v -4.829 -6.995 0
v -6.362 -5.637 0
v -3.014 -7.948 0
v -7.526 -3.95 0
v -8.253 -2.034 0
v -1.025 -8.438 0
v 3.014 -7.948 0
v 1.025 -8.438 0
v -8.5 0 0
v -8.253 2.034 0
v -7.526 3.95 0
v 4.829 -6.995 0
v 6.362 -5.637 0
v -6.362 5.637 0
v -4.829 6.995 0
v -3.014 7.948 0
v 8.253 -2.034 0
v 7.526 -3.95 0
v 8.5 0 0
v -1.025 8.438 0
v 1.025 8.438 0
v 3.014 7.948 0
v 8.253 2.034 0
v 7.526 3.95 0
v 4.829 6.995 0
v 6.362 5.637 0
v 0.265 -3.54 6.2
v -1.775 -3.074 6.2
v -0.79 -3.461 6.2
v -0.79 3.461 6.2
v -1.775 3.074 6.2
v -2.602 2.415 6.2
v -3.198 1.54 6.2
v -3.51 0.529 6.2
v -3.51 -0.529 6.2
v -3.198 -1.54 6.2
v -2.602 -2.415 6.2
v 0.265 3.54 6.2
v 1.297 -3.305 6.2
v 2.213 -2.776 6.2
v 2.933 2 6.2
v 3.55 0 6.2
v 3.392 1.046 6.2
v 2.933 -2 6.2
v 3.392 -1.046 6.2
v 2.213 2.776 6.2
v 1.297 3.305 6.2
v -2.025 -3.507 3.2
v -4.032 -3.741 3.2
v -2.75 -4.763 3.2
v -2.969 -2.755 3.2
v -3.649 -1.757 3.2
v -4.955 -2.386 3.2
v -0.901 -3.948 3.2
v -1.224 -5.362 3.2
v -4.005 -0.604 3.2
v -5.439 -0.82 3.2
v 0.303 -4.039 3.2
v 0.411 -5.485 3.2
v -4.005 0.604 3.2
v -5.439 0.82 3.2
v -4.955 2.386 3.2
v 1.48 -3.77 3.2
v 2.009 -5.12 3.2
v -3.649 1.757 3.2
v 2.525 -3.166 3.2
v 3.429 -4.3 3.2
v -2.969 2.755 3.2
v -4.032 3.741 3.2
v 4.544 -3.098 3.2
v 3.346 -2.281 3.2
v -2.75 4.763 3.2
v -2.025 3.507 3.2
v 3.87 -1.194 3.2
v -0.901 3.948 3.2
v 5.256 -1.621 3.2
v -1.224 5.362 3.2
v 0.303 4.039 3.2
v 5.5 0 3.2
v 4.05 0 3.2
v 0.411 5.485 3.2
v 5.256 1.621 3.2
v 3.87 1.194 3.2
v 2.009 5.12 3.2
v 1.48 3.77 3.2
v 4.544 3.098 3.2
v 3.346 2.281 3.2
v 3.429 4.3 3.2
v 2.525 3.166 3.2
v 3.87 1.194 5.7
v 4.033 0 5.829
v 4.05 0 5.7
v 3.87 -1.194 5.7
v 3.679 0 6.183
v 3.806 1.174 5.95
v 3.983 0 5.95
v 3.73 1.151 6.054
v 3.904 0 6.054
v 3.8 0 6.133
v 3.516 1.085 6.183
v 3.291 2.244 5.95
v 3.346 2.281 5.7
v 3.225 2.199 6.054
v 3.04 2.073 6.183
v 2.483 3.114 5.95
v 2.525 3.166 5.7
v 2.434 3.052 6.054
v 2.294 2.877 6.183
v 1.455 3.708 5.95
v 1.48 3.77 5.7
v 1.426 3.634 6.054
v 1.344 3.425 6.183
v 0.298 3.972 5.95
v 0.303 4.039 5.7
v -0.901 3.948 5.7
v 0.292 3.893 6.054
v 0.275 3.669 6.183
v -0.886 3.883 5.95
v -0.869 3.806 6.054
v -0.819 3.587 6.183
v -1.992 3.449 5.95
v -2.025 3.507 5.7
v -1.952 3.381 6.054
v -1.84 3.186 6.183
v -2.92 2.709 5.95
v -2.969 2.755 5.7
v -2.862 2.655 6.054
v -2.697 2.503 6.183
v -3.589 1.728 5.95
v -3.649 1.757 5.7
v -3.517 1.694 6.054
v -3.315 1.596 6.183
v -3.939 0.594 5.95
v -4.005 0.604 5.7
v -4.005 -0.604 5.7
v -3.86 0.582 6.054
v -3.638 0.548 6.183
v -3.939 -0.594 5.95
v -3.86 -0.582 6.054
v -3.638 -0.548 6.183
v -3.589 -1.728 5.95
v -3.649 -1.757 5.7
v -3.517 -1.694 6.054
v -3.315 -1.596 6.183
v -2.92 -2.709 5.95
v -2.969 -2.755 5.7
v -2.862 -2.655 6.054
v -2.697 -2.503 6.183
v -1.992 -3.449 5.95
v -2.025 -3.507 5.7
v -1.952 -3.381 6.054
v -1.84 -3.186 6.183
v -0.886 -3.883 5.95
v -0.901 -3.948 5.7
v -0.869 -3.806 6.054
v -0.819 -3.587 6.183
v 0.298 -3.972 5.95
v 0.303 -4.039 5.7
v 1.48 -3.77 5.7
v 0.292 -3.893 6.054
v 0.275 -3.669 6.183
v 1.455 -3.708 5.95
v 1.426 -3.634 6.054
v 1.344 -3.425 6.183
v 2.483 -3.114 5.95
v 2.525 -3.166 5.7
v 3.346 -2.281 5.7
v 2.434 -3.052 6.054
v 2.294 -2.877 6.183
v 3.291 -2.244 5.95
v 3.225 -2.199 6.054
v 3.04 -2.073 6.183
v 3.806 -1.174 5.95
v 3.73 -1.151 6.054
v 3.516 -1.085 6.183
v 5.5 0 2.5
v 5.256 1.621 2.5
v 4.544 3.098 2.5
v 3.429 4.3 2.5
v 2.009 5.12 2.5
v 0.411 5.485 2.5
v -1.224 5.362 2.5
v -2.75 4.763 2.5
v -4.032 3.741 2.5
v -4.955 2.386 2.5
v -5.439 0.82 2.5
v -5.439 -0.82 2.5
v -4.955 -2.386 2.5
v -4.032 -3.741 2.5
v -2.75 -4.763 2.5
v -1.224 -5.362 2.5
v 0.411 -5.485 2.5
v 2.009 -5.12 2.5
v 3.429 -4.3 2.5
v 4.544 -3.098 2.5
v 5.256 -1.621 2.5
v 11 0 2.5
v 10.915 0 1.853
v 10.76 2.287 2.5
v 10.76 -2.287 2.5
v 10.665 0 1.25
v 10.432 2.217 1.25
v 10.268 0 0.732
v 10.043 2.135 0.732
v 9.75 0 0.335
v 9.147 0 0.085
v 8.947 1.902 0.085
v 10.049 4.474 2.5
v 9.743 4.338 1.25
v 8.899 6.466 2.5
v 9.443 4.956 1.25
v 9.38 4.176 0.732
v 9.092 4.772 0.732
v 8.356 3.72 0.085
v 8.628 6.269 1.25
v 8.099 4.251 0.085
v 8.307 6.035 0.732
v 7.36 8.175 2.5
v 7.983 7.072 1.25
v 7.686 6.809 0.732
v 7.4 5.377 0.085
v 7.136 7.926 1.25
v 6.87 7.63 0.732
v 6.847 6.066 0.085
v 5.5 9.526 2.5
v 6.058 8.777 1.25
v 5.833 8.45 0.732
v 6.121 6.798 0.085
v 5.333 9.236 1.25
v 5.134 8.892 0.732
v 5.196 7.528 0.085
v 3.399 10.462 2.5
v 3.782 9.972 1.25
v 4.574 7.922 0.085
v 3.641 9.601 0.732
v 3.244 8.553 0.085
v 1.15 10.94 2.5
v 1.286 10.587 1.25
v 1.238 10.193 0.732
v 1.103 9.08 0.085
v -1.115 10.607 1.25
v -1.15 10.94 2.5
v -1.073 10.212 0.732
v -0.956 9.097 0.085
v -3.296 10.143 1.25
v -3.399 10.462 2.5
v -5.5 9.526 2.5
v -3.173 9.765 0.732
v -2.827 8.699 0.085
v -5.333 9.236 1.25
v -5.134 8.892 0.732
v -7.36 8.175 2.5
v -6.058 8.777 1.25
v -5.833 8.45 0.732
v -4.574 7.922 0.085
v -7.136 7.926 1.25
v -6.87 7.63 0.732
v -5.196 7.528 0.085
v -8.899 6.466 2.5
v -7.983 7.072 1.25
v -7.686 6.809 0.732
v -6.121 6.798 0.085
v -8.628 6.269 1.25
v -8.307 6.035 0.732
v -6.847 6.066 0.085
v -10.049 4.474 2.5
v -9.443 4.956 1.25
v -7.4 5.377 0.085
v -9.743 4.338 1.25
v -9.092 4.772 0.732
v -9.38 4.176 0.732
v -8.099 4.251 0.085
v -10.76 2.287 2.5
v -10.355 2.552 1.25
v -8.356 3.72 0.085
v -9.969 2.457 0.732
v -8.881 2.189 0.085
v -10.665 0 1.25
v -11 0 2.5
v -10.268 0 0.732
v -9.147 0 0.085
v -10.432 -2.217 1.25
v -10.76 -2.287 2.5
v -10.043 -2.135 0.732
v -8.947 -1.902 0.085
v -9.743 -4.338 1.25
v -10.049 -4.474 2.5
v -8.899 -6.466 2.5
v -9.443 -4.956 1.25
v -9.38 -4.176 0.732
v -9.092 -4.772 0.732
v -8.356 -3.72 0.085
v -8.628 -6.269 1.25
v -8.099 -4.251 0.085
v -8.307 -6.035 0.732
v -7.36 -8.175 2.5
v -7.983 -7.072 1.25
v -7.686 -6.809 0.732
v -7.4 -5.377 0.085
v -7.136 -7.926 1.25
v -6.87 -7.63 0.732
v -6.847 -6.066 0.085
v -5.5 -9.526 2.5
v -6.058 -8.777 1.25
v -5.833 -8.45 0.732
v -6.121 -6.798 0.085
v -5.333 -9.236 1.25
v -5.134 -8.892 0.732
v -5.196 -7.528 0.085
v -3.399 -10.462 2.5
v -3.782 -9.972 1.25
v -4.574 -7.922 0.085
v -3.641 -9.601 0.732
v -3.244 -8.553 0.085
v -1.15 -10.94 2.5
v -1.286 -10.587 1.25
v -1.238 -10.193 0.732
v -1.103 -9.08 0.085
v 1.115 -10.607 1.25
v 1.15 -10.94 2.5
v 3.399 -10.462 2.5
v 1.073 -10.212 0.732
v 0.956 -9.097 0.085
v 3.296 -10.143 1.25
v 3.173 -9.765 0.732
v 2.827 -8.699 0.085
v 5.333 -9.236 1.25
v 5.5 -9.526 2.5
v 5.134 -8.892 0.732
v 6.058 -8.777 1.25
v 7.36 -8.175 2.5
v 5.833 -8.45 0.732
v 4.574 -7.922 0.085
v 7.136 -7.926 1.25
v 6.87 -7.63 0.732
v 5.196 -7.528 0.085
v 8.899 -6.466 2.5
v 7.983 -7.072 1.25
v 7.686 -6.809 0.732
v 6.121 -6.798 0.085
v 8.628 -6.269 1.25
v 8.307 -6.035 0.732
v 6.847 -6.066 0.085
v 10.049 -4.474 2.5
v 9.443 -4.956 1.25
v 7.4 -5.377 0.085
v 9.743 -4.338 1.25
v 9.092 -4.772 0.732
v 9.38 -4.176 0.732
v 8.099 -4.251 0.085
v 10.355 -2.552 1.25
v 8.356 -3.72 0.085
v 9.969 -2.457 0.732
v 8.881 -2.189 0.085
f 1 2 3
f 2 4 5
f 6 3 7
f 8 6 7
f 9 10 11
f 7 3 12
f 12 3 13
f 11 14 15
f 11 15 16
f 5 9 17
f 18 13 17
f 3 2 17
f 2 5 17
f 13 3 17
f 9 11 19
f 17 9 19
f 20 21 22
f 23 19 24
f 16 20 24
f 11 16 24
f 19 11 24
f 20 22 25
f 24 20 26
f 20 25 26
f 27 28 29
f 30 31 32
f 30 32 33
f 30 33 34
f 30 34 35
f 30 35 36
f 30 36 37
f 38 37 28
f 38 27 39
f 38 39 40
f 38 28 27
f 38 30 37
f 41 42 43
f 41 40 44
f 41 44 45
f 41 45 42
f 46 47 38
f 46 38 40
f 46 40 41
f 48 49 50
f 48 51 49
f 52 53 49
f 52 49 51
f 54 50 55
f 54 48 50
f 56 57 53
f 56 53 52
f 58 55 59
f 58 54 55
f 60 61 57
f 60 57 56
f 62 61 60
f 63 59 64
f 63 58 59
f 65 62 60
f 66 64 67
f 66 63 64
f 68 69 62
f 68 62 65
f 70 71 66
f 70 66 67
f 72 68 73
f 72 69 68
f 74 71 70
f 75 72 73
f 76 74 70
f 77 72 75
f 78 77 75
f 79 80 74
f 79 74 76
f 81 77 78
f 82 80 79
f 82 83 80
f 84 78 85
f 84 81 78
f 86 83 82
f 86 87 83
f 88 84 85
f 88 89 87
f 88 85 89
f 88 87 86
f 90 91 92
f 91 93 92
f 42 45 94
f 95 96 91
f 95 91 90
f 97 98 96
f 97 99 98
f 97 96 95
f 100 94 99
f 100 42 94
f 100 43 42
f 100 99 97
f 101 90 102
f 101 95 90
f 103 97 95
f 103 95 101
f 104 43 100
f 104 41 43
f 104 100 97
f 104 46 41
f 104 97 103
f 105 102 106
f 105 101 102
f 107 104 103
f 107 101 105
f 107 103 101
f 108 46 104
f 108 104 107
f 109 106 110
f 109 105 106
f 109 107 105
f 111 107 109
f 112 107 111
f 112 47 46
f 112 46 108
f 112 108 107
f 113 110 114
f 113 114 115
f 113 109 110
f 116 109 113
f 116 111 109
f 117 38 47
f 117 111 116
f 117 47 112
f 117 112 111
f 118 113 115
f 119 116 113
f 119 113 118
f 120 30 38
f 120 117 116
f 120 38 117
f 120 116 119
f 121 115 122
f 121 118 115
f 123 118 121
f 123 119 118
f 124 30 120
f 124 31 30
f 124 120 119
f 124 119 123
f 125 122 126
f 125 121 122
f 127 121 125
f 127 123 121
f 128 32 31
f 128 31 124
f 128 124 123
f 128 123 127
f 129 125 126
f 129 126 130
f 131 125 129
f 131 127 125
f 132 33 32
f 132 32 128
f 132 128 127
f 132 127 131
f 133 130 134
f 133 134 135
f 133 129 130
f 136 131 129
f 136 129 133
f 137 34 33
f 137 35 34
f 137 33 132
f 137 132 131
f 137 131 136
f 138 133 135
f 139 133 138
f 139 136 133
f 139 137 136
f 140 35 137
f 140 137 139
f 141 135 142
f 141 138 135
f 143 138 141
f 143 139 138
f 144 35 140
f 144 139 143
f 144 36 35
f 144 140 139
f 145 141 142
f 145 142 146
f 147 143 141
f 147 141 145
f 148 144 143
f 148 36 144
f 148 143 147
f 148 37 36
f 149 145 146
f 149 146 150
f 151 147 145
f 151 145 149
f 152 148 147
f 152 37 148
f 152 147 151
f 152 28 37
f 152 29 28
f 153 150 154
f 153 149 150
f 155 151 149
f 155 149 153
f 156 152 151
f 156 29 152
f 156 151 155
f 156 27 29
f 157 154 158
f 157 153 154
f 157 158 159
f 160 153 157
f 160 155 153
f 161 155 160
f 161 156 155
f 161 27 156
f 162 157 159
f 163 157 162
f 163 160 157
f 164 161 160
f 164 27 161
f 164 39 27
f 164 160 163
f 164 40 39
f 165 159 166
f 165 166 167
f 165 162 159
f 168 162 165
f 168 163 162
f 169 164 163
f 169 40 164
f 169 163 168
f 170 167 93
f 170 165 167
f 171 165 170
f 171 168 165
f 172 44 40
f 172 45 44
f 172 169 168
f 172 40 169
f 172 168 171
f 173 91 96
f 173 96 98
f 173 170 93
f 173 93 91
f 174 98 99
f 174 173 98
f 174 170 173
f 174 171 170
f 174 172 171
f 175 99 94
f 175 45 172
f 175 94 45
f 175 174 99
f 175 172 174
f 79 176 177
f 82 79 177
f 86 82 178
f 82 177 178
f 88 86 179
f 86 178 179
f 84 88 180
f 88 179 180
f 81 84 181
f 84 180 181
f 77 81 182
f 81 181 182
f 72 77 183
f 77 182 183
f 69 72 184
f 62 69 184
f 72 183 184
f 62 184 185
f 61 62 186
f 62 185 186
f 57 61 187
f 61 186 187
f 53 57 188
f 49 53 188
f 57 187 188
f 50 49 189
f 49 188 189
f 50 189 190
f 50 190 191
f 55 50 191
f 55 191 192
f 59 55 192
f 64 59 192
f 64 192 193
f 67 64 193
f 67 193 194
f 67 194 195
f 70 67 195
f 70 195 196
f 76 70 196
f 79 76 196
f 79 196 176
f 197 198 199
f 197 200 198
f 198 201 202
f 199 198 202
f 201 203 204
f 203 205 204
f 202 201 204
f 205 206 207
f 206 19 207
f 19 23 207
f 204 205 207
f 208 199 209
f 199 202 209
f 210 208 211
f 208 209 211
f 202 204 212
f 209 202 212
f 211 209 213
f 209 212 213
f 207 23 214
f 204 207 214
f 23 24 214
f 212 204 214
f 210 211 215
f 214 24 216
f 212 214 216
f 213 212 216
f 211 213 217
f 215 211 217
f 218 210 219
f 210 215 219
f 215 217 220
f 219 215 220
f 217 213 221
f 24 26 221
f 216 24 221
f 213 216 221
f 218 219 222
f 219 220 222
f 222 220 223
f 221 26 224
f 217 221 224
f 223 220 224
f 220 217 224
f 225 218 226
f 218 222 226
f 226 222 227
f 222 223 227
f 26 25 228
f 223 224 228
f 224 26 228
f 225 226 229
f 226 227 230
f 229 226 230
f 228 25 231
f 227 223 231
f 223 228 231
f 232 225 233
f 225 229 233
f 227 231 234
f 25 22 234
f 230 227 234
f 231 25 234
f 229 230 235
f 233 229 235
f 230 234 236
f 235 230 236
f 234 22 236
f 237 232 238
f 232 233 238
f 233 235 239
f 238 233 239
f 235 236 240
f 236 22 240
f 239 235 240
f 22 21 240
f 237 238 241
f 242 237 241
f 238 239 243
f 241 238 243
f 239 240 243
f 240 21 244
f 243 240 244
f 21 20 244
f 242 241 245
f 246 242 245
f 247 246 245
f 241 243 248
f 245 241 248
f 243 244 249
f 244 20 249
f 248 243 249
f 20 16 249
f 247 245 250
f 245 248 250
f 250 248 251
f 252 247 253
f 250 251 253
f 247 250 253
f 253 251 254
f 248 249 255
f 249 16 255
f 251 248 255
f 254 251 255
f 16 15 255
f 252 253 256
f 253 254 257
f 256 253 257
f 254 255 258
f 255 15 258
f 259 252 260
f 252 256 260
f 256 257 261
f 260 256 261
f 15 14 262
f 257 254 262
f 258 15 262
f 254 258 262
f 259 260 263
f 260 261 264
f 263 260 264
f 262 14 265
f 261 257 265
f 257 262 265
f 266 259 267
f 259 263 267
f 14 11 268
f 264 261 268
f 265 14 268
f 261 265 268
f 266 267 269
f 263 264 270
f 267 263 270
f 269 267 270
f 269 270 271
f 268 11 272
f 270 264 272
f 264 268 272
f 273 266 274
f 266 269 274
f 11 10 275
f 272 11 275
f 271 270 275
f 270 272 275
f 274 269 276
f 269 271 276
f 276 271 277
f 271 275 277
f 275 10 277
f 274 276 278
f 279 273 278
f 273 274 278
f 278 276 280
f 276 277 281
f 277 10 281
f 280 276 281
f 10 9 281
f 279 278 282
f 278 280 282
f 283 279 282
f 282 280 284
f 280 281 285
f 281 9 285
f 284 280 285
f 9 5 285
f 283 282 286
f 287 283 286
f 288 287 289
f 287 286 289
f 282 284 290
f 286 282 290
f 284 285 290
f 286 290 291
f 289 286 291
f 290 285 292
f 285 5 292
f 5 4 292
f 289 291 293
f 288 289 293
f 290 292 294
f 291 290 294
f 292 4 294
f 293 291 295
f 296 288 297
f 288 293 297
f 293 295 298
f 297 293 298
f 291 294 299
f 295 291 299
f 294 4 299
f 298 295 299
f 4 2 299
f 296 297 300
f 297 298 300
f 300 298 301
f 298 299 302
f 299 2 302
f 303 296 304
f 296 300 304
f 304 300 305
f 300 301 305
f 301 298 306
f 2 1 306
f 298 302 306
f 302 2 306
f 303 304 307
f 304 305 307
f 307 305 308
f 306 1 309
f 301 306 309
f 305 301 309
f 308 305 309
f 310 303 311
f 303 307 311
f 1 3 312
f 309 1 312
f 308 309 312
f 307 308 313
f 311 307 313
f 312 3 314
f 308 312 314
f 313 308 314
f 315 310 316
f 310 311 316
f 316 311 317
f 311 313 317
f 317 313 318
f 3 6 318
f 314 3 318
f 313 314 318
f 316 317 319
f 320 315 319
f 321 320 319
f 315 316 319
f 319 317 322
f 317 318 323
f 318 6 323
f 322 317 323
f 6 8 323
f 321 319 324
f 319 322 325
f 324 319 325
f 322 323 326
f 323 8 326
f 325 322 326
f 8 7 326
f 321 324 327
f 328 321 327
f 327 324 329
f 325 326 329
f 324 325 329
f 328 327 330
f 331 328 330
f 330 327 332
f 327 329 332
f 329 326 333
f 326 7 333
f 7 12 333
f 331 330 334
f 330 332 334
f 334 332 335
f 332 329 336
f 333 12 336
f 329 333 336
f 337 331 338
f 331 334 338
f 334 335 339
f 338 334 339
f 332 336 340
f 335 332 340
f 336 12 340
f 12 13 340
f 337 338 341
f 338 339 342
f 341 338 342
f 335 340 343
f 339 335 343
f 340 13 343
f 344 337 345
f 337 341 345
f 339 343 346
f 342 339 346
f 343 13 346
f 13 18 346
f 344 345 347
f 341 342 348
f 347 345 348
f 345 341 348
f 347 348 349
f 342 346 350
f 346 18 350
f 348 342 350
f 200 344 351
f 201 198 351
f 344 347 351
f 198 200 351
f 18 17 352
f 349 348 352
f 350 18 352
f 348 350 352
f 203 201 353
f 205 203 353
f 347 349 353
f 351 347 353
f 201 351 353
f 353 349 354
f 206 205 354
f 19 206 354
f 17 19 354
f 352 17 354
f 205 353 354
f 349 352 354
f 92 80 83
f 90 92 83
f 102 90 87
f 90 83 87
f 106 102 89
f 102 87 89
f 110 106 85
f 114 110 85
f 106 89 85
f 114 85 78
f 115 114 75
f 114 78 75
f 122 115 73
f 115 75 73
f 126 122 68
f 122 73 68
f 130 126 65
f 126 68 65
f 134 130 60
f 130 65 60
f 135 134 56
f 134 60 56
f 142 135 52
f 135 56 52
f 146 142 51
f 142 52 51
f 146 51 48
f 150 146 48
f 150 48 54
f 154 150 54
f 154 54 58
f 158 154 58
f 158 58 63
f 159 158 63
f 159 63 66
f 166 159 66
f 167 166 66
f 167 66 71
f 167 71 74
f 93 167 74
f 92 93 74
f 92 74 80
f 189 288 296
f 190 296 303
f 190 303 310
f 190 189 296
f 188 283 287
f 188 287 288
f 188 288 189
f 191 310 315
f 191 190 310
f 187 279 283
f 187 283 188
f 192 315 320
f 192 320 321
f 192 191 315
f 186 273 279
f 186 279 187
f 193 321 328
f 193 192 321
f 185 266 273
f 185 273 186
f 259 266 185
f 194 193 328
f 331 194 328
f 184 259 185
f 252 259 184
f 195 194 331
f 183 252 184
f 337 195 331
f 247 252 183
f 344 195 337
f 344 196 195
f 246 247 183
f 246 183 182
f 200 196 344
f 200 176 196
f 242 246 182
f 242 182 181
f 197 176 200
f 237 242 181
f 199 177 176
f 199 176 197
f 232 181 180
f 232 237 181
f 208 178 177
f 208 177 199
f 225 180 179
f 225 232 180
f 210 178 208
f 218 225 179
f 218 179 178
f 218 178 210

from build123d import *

# Parameters (mm, degrees)
F0_R     = 11
F0_R_2   = 5.5
F1_DEPTH = 2.5
F0_R_3   = 4.05
F2_DEPTH = 3.2
F3_DEPTH = 6.2
F4_R     = 2.49999
F5_R     = 0.5


# Not quite as in the source:
# - a fillet or chamfer is up to 0.001 mm smaller than in the source, because OpenCascade refuses the exact size


with BuildPart() as f1:
    # F0 (on Top) → F1 (new body)
    with BuildSketch(Plane.XY):
        Circle(F0_R)
        Circle(F0_R_2, mode=Mode.SUBTRACT)
    extrude(amount=F1_DEPTH)

    # F0 (on Top) → F2 (join)
    with BuildSketch(Plane.XY):
        Circle(F0_R_2)
        Circle(F0_R_3, mode=Mode.SUBTRACT)
    extrude(amount=F2_DEPTH)

    # F0 (on Top) → F3 (join)
    with BuildSketch(Plane.XY):
        Circle(F0_R_3)
    extrude(amount=F3_DEPTH)

    # F4 (radius 2.5 in the source; OpenCascade refuses exactly that, so slightly less here)
    f4_edges = [f1.edges().sort_by_distance(p)[0] for p in [
        (-11, 0, 0),
    ]]
    fillet(f4_edges, radius=F4_R)

    # F5
    f5_edges = [f1.edges().sort_by_distance(p)[0] for p in [
        (-4.05, 0, 6.2),
    ]]
    fillet(f5_edges, radius=F5_R)


solid = f1.part
